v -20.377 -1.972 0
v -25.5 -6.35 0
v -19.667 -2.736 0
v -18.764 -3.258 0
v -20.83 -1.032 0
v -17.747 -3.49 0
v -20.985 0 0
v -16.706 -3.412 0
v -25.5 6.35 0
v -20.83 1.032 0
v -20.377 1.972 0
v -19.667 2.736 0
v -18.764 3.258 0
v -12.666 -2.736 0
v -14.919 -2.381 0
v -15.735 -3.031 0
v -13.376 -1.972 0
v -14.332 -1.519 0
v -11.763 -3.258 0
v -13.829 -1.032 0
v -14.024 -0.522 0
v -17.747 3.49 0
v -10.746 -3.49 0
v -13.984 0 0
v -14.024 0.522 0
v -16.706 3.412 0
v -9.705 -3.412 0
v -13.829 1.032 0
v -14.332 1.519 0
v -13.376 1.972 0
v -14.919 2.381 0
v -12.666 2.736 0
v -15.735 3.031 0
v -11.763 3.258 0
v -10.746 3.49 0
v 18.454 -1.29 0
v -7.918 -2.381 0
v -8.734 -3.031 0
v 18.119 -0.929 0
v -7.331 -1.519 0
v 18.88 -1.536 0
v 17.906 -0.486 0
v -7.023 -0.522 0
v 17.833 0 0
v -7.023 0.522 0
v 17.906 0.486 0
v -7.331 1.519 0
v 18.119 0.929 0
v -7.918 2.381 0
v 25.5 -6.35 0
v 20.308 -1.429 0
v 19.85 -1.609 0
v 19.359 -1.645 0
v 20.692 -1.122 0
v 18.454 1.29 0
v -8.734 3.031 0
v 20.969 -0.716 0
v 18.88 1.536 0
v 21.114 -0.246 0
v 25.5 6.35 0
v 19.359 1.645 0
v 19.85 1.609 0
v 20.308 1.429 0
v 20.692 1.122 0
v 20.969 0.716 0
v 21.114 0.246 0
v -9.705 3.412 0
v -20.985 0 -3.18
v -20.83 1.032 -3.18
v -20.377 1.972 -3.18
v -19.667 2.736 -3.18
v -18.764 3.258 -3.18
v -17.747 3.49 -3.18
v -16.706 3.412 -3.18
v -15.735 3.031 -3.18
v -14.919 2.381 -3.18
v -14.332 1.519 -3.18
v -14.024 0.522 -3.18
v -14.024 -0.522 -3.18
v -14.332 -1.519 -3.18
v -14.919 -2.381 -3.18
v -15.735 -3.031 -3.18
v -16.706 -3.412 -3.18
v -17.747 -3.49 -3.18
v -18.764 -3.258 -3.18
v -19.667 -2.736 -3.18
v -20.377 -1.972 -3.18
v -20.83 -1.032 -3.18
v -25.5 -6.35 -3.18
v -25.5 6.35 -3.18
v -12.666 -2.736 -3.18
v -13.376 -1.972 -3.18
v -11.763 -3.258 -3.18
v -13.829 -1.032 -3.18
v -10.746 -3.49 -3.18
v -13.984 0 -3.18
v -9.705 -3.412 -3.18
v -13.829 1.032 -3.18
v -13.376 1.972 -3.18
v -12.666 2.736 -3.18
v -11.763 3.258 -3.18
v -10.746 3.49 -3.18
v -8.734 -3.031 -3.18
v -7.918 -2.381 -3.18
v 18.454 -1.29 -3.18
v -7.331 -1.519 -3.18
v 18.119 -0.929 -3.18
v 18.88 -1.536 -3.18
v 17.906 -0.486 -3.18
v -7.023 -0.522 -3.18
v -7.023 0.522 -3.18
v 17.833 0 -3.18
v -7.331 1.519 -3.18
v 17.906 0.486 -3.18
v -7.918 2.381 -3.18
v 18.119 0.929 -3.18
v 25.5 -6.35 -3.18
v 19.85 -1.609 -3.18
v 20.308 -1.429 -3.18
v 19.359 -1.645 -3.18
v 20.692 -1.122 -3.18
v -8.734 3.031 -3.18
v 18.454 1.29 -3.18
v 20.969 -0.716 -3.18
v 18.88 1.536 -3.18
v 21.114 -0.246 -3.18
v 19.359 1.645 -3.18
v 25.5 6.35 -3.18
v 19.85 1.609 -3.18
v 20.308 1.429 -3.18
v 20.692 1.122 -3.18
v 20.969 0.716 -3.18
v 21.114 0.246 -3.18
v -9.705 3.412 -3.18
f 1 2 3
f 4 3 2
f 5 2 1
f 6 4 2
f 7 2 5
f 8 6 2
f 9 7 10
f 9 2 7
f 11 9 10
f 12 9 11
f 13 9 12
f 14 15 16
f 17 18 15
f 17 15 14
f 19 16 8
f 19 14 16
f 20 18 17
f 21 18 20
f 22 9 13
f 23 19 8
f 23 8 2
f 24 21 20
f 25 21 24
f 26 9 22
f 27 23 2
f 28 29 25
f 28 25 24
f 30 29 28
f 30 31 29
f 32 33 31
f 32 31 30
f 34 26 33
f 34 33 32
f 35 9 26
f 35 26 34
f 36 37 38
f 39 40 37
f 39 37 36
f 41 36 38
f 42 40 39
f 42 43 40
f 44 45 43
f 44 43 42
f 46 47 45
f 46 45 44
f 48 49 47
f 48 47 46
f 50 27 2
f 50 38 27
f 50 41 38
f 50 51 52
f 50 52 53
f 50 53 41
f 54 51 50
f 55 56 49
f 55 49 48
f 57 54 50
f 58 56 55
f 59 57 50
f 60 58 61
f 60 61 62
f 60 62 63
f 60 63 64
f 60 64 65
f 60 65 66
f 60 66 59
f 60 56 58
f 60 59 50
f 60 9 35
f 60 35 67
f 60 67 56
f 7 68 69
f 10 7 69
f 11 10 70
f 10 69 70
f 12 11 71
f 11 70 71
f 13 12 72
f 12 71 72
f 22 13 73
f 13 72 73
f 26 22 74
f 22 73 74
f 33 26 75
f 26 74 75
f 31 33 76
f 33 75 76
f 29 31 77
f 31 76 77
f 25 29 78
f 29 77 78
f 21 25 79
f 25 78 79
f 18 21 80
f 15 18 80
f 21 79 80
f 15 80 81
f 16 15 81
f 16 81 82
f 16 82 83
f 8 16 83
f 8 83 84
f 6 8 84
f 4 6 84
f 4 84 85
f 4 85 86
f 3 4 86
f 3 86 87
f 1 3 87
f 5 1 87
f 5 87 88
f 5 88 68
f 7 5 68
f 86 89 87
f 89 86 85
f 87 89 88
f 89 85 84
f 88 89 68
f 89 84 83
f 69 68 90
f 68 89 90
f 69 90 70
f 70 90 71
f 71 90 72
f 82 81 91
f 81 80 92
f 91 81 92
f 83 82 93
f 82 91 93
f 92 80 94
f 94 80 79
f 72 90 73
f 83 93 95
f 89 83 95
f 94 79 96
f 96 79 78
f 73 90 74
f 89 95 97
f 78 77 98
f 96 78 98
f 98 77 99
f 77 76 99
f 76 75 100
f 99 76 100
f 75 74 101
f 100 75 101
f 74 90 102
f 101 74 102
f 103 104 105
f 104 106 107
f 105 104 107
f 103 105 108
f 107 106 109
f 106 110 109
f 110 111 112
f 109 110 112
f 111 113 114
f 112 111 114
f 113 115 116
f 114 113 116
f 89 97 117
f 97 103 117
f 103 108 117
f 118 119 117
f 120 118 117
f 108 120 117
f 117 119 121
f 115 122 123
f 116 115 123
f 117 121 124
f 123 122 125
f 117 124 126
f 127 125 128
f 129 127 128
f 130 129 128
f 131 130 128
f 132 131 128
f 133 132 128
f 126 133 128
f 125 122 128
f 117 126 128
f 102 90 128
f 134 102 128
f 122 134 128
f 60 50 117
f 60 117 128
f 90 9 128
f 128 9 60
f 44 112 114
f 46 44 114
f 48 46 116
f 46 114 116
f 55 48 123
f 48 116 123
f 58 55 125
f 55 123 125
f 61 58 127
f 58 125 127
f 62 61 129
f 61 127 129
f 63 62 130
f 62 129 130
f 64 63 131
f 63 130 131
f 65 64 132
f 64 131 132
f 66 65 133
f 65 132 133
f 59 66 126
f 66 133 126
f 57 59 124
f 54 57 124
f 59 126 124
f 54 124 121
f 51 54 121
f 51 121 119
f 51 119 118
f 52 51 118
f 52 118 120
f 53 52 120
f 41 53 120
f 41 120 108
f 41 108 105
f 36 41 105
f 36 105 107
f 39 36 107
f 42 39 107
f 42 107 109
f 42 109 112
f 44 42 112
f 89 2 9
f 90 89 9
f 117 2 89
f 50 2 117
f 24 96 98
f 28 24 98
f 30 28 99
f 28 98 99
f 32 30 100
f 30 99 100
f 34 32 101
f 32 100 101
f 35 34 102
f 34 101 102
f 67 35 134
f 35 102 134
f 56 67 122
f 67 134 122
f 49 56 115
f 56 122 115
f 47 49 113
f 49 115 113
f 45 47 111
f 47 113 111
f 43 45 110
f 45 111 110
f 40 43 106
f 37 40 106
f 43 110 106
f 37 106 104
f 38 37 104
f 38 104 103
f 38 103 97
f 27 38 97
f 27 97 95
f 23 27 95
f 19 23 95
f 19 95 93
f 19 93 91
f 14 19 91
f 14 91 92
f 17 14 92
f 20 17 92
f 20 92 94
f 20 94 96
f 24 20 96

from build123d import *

# Parameters (mm, degrees)
ESBO_O1_W             = 51
ESBO_O1_H             = 12.7
FLANGE_BASE1_DEPTH    = 3.18
ESBO_O2_R             = 3.5
ESBO_O2_R_2           = 1.65
CORTE_EXTRUS_O1_DEPTH = 10


# Sheet-metal steps are written as plain solids
with BuildPart() as part:
    # Esboço1 → Flange-base1 (new body)
    with BuildSketch(Plane.XY):
        Rectangle(ESBO_O1_W, ESBO_O1_H)
    extrude(amount=-FLANGE_BASE1_DEPTH)

    # Esboço2 → Corte-extrusão1 (cut)
    with BuildSketch(Plane(origin=(0, 0, -3.18), x_dir=(-1, 0, 0), z_dir=(0, 0, -1))):
        with Locations((17.485, 0)):
            Circle(ESBO_O2_R)
        with Locations((-19.4825, 0)):
            Circle(ESBO_O2_R_2)
        with Locations((10.484, 0)):
            Circle(ESBO_O2_R)
    extrude(amount=-CORTE_EXTRUS_O1_DEPTH, mode=Mode.SUBTRACT)


solid = part.part
